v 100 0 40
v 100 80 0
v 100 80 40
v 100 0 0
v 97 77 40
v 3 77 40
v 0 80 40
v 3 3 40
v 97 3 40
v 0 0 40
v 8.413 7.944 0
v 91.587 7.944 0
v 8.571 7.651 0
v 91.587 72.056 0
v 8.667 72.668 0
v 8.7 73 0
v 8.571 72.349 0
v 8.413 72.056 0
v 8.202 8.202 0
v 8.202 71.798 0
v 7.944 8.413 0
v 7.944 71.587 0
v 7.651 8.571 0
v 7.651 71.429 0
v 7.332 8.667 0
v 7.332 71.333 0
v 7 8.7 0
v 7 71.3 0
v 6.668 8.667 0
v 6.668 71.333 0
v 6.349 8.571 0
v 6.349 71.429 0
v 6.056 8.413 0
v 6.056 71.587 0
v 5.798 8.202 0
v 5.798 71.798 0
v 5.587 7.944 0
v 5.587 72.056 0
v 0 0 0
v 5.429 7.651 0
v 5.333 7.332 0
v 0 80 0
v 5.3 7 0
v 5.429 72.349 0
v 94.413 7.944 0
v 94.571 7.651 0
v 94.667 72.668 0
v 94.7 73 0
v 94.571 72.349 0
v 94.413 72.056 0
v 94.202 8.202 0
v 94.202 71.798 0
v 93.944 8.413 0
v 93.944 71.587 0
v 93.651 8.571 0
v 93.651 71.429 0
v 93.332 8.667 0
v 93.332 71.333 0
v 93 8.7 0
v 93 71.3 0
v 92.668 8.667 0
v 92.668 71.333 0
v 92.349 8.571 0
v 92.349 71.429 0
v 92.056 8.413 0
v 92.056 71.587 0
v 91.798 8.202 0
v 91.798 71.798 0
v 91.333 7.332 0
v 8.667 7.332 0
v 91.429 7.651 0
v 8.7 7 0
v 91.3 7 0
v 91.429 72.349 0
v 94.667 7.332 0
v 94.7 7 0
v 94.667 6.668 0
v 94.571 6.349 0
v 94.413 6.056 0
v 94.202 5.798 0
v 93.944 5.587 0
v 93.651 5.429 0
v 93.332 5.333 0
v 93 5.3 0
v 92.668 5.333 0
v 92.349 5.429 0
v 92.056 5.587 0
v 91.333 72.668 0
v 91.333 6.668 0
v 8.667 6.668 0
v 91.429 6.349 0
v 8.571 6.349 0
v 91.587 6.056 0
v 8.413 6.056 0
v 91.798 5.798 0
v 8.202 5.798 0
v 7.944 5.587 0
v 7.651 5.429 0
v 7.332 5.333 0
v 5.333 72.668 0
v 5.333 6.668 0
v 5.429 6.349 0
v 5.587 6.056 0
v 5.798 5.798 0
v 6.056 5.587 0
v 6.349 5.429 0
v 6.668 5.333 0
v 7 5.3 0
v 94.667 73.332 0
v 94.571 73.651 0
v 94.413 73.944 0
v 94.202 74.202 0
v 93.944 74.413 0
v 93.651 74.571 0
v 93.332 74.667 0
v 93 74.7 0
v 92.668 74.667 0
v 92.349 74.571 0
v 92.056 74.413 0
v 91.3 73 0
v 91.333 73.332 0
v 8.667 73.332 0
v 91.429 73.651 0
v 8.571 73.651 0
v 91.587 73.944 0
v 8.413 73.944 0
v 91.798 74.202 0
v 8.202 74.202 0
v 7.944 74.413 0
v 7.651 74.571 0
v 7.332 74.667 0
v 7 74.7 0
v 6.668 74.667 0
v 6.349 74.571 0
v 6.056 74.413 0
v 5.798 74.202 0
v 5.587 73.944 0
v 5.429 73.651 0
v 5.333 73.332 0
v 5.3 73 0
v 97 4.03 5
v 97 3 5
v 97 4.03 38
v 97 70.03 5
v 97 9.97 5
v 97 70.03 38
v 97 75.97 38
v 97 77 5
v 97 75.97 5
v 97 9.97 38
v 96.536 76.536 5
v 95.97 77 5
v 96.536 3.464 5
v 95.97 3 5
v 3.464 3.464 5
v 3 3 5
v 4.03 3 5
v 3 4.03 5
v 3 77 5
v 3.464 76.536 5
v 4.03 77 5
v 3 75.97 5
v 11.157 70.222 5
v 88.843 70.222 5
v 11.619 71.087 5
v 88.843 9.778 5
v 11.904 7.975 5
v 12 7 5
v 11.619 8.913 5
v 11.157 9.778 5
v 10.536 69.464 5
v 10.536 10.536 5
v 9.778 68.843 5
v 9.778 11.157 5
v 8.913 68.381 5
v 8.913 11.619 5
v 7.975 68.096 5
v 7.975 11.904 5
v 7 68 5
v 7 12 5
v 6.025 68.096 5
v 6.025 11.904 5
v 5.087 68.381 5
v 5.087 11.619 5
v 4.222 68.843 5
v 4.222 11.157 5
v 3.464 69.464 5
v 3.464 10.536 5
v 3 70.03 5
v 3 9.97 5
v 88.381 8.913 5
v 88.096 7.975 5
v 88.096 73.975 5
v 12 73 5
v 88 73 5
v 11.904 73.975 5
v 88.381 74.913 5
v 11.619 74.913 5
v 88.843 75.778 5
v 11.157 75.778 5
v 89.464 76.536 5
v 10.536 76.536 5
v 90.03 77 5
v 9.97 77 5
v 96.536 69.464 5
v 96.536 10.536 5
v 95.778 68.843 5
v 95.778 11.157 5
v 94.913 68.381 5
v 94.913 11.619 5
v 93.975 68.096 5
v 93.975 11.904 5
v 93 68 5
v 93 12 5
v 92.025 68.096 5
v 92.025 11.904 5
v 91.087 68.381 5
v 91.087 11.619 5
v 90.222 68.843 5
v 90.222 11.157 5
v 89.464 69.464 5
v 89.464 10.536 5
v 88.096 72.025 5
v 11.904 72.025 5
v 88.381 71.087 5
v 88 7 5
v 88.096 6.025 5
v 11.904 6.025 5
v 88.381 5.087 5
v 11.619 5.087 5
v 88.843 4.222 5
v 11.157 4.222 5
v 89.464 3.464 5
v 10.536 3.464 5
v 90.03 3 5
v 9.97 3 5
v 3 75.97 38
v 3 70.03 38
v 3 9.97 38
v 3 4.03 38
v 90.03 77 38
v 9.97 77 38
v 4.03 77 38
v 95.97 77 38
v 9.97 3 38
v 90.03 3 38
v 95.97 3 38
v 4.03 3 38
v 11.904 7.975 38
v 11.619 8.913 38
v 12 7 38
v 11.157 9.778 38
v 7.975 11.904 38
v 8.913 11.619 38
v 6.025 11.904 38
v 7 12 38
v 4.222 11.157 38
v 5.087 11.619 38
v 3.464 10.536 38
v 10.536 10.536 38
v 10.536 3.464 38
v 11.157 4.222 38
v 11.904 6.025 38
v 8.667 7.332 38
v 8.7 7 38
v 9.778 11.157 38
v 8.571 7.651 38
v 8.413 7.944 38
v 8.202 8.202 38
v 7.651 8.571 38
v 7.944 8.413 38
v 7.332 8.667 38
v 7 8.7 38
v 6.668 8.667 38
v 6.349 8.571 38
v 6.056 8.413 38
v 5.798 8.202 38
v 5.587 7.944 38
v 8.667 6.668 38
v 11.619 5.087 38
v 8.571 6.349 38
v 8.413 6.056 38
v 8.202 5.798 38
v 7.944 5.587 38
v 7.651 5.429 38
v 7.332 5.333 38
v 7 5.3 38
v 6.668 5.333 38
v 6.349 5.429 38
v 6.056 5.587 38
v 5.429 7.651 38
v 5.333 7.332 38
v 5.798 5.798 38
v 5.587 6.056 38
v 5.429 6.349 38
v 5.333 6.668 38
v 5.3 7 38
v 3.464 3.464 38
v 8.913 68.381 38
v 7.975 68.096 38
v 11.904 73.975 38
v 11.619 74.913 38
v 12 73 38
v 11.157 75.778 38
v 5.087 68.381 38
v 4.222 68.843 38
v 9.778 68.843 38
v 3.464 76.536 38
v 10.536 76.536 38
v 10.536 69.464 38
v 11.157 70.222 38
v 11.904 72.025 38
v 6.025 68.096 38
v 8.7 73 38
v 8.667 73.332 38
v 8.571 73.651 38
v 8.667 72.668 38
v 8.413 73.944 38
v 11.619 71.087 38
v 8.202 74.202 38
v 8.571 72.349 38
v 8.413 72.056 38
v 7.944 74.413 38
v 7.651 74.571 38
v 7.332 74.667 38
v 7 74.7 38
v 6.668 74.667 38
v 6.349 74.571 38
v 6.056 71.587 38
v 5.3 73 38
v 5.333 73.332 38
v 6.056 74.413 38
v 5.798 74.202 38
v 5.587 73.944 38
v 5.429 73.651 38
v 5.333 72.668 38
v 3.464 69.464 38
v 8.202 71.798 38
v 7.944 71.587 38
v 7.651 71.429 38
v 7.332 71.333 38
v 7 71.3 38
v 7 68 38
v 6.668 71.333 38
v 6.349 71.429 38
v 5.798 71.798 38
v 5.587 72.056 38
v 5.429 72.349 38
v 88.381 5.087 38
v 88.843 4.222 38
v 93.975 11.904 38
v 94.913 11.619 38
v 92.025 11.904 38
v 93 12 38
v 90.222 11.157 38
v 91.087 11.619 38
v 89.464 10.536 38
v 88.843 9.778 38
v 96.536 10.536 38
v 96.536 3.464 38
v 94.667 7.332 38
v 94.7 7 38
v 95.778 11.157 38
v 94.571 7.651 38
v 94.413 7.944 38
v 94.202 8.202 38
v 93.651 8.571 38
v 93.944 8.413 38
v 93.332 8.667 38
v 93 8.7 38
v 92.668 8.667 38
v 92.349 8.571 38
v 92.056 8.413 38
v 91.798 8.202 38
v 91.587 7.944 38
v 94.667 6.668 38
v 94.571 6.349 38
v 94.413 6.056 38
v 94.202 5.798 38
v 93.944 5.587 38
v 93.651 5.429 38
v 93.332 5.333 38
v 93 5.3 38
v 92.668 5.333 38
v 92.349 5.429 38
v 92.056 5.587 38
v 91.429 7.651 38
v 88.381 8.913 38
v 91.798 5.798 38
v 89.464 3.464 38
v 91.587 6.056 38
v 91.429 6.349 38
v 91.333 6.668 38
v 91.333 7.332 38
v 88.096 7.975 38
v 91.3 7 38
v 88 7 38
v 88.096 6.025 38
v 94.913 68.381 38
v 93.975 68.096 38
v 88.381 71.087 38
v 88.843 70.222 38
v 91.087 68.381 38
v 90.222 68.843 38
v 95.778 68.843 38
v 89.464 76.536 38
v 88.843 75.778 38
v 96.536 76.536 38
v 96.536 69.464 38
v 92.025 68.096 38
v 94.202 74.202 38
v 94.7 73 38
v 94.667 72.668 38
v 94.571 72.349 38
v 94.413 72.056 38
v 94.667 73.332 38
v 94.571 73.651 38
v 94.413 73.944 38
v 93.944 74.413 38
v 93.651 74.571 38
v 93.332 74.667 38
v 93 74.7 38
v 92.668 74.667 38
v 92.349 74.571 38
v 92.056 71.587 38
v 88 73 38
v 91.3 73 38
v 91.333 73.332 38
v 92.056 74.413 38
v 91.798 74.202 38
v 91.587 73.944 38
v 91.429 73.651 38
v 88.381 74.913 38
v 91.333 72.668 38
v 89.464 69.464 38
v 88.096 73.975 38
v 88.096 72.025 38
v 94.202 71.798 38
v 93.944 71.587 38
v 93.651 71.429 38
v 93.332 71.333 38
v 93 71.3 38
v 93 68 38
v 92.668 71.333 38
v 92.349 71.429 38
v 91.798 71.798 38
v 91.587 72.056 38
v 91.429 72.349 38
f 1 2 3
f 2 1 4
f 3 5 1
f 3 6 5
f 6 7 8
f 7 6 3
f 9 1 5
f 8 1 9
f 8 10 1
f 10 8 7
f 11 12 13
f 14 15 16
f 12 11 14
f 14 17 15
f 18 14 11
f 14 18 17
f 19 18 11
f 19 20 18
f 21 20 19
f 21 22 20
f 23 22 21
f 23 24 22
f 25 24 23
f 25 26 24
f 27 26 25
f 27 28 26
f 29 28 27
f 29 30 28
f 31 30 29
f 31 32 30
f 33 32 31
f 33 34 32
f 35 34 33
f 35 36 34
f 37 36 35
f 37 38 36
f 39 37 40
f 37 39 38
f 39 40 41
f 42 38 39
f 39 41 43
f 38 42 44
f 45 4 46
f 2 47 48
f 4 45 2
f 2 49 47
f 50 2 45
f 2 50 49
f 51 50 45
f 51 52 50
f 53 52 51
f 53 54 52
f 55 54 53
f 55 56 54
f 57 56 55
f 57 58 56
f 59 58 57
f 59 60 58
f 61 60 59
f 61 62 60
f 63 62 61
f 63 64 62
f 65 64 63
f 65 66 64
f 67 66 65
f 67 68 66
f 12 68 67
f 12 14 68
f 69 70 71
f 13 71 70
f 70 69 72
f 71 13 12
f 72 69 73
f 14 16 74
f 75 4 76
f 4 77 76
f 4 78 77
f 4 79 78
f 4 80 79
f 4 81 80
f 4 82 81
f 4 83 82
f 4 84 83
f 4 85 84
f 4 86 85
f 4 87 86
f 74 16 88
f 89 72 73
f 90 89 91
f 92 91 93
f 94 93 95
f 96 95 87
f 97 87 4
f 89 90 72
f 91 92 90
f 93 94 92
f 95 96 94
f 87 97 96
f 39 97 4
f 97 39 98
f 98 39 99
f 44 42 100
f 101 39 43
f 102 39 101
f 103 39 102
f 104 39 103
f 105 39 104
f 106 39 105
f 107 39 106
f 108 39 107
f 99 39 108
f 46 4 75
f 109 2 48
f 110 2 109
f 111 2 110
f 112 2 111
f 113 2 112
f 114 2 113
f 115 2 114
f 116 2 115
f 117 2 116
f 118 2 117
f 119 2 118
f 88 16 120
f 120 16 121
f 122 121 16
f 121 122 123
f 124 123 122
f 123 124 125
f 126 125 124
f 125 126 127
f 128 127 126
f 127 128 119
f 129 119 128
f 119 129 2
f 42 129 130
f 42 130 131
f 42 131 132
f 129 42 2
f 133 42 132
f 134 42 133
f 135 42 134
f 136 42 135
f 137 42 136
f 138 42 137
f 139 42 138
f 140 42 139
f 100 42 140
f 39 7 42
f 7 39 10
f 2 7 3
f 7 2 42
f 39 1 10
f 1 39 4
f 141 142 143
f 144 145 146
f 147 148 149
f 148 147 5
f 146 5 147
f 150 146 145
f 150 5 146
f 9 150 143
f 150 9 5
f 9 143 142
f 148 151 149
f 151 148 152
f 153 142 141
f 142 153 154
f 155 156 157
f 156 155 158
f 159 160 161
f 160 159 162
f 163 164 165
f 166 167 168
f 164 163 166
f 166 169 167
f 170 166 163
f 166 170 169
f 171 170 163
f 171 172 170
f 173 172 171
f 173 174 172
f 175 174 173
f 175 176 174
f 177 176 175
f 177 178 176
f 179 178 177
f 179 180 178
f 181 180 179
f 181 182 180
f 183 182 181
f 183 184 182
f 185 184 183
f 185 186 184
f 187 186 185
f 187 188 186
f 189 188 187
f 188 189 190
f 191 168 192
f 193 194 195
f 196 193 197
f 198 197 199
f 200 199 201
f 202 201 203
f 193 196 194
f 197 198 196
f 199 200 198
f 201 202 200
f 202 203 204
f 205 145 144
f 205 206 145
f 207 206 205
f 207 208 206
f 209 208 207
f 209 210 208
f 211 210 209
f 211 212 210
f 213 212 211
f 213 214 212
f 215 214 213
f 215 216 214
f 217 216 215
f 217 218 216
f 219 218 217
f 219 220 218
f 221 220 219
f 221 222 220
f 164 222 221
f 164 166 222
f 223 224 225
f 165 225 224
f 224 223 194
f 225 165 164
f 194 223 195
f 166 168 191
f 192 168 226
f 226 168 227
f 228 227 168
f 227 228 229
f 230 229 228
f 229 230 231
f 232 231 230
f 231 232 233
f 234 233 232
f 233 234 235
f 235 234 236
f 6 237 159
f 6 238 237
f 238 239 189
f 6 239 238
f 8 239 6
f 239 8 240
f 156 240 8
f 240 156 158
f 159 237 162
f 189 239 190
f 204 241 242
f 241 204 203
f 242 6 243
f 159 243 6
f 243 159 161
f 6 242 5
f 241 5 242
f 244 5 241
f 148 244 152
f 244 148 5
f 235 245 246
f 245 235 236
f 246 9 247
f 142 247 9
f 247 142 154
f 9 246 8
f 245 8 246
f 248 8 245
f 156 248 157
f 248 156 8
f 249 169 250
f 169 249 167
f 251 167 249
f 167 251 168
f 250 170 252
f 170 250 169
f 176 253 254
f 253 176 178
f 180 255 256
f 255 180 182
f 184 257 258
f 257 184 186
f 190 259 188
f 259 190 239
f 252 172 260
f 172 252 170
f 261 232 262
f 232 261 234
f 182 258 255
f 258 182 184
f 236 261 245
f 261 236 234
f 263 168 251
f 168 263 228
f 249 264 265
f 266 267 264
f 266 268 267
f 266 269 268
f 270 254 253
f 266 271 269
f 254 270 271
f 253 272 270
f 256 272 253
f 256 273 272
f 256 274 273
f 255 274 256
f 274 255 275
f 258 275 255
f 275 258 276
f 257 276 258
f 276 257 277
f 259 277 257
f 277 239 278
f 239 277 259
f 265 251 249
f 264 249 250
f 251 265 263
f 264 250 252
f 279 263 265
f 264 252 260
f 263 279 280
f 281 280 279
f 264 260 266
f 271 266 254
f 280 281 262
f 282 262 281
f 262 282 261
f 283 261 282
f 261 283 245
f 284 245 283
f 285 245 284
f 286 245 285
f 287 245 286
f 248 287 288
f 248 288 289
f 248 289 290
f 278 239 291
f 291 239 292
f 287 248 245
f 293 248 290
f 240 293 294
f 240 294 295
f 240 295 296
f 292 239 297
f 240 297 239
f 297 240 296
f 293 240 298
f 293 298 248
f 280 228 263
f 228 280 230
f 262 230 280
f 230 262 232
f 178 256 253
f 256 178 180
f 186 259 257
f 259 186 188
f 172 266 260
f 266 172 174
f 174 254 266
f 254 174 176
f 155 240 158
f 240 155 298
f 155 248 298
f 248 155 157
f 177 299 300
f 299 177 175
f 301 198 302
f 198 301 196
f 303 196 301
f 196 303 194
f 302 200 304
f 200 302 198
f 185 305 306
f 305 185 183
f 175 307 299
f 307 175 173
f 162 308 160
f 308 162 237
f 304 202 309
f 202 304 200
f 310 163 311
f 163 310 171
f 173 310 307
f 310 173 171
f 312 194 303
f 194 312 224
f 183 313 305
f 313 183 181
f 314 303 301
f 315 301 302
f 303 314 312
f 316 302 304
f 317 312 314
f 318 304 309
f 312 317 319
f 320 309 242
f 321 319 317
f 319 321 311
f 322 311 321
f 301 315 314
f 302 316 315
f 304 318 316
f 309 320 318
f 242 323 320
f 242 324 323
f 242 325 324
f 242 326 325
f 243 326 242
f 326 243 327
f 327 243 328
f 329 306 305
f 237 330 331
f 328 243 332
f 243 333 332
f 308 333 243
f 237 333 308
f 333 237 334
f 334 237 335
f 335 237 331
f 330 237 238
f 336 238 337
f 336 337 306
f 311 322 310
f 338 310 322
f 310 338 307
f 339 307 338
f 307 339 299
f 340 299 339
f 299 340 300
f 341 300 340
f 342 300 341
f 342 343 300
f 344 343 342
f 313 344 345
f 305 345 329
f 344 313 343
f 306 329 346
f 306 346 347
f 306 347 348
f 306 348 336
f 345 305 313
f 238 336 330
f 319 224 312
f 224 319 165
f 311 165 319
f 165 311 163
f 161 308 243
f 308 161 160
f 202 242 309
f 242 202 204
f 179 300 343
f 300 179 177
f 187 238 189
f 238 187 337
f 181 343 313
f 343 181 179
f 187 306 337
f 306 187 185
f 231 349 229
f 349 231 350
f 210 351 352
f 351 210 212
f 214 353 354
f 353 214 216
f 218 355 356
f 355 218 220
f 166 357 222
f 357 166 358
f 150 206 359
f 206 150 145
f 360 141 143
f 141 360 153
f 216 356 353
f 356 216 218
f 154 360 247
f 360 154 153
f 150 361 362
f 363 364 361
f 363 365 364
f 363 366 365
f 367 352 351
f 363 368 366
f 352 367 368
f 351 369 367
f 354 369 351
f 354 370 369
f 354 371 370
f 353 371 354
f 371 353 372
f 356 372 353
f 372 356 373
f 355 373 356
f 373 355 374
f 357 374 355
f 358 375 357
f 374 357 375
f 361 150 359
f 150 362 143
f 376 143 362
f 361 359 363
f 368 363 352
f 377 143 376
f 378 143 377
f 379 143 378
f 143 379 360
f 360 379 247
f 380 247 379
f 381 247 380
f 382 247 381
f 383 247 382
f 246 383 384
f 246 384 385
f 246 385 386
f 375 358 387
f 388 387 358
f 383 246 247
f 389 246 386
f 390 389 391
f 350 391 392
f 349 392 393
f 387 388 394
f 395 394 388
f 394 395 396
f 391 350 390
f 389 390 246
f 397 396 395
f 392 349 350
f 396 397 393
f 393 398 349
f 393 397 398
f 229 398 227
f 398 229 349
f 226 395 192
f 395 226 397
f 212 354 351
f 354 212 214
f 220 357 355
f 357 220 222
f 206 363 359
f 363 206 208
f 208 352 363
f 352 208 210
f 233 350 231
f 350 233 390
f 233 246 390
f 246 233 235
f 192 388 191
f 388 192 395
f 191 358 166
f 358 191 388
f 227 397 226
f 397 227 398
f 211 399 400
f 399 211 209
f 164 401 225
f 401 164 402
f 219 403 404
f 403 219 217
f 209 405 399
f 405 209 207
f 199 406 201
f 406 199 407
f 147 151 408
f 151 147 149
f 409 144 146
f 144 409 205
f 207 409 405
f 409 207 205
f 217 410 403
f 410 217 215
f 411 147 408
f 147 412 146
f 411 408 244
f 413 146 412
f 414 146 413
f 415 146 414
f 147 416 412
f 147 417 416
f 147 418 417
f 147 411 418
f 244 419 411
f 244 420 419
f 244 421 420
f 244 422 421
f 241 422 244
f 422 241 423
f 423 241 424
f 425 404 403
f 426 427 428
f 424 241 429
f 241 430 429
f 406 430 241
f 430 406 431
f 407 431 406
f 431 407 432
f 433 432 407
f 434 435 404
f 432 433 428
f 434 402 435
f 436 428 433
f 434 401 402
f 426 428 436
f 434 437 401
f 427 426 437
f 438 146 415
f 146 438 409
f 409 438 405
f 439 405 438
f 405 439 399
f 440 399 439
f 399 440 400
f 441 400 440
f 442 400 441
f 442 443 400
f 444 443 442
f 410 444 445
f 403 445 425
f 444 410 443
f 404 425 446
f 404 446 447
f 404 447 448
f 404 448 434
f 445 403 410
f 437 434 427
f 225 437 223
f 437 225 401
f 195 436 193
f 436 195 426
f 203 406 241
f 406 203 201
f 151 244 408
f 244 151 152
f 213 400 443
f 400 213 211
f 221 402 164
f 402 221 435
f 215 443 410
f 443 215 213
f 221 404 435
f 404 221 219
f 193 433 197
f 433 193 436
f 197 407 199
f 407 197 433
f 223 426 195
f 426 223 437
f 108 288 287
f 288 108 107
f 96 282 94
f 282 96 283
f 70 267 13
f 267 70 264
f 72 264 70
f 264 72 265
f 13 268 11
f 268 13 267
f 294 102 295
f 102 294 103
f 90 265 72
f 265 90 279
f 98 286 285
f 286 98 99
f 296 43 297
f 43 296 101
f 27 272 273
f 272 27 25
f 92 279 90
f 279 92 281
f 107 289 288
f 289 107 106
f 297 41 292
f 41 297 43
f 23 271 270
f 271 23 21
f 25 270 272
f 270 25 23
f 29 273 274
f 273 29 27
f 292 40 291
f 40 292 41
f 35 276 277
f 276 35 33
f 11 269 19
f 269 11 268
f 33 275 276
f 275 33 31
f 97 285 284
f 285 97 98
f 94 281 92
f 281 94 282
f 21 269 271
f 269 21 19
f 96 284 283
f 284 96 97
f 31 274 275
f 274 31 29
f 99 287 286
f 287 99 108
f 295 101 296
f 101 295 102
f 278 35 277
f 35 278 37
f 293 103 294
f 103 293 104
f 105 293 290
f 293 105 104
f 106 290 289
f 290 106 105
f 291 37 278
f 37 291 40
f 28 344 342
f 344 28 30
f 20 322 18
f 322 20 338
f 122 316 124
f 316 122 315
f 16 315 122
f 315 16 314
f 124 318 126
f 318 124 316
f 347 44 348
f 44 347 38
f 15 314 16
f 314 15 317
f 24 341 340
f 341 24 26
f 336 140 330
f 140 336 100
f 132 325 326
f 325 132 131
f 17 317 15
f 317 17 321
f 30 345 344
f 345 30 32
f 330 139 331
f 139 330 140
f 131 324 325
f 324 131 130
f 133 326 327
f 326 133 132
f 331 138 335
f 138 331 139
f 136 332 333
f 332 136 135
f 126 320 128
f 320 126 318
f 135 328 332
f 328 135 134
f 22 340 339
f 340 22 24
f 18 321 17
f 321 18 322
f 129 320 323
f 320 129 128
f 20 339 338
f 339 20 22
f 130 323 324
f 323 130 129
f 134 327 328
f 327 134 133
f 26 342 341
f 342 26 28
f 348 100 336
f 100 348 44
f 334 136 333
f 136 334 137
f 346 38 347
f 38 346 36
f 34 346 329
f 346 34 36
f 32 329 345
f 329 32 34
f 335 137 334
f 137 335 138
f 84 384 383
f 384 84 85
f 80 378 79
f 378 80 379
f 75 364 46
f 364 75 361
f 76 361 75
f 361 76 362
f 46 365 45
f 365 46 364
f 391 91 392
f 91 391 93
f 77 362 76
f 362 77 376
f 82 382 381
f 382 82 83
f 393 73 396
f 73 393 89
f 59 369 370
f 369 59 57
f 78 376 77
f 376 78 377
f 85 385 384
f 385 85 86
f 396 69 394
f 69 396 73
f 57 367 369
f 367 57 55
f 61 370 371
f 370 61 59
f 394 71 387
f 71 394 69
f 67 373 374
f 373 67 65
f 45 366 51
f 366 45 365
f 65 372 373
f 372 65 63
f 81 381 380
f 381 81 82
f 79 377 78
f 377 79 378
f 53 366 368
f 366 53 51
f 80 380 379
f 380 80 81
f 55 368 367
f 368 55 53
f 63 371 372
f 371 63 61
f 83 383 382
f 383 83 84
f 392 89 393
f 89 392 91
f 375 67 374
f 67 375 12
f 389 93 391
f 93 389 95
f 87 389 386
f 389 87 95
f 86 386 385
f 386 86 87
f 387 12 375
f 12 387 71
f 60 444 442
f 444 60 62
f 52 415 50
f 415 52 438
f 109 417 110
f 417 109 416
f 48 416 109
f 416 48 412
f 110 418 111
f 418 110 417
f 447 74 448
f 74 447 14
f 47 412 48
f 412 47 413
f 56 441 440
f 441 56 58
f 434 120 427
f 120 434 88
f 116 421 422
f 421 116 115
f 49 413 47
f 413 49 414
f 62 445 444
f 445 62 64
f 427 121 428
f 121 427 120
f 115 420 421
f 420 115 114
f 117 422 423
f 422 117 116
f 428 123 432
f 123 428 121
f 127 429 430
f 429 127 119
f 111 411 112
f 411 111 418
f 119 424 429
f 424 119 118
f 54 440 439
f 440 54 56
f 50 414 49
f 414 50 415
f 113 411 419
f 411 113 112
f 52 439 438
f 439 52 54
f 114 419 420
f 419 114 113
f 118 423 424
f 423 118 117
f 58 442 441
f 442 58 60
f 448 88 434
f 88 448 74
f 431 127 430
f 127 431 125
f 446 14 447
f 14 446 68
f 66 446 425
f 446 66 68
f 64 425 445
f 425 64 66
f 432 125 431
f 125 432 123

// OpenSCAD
$fn = 32;

// ----------------------------------------------------------------------
// Enclosure body: 100 x 80 x 40 mm, wall 3 mm
// ----------------------------------------------------------------------

// --- parameters (mm) ---
length = 100;             // outside length, X
width = 80;               // outside width, Y
height = 40;              // outside height, Z
wall = 3;                 // side wall thickness
floor_t = 5;              // floor thickness
boss_d = 10;              // corner boss diameter
boss_h = 33;              // corner boss height above the floor
boss_hole_d = 3.4;        // lid screw clearance in the boss
boss_lip = 7;             // boss centre inset from the corner

module shell() {
  difference() {
    cube([length, width, height]);
    /* hollow, open at the top */
    translate([wall, wall, floor_t])
      cube([length - 2 * wall, width - 2 * wall, height]);
  }
}

module bosses() {
  /* corner bosses, sunk 1 mm into the floor */
  for (sx = [0, 1]) for (sy = [0, 1])
    translate([sx * (length - 2 * boss_lip) + boss_lip, sy * (width - 2 * boss_lip) + boss_lip, floor_t - 1])
      cylinder(h = boss_h + 1, d = boss_d);
}

difference() {
  union() {
    shell();
    bosses();
  }
  /* boss screw holes */
  for (sx = [0, 1]) for (sy = [0, 1])
    translate([sx * (length - 2 * boss_lip) + boss_lip, sy * (width - 2 * boss_lip) + boss_lip, -1]) cylinder(h = floor_t + boss_h + 2, d = boss_hole_d);
}
